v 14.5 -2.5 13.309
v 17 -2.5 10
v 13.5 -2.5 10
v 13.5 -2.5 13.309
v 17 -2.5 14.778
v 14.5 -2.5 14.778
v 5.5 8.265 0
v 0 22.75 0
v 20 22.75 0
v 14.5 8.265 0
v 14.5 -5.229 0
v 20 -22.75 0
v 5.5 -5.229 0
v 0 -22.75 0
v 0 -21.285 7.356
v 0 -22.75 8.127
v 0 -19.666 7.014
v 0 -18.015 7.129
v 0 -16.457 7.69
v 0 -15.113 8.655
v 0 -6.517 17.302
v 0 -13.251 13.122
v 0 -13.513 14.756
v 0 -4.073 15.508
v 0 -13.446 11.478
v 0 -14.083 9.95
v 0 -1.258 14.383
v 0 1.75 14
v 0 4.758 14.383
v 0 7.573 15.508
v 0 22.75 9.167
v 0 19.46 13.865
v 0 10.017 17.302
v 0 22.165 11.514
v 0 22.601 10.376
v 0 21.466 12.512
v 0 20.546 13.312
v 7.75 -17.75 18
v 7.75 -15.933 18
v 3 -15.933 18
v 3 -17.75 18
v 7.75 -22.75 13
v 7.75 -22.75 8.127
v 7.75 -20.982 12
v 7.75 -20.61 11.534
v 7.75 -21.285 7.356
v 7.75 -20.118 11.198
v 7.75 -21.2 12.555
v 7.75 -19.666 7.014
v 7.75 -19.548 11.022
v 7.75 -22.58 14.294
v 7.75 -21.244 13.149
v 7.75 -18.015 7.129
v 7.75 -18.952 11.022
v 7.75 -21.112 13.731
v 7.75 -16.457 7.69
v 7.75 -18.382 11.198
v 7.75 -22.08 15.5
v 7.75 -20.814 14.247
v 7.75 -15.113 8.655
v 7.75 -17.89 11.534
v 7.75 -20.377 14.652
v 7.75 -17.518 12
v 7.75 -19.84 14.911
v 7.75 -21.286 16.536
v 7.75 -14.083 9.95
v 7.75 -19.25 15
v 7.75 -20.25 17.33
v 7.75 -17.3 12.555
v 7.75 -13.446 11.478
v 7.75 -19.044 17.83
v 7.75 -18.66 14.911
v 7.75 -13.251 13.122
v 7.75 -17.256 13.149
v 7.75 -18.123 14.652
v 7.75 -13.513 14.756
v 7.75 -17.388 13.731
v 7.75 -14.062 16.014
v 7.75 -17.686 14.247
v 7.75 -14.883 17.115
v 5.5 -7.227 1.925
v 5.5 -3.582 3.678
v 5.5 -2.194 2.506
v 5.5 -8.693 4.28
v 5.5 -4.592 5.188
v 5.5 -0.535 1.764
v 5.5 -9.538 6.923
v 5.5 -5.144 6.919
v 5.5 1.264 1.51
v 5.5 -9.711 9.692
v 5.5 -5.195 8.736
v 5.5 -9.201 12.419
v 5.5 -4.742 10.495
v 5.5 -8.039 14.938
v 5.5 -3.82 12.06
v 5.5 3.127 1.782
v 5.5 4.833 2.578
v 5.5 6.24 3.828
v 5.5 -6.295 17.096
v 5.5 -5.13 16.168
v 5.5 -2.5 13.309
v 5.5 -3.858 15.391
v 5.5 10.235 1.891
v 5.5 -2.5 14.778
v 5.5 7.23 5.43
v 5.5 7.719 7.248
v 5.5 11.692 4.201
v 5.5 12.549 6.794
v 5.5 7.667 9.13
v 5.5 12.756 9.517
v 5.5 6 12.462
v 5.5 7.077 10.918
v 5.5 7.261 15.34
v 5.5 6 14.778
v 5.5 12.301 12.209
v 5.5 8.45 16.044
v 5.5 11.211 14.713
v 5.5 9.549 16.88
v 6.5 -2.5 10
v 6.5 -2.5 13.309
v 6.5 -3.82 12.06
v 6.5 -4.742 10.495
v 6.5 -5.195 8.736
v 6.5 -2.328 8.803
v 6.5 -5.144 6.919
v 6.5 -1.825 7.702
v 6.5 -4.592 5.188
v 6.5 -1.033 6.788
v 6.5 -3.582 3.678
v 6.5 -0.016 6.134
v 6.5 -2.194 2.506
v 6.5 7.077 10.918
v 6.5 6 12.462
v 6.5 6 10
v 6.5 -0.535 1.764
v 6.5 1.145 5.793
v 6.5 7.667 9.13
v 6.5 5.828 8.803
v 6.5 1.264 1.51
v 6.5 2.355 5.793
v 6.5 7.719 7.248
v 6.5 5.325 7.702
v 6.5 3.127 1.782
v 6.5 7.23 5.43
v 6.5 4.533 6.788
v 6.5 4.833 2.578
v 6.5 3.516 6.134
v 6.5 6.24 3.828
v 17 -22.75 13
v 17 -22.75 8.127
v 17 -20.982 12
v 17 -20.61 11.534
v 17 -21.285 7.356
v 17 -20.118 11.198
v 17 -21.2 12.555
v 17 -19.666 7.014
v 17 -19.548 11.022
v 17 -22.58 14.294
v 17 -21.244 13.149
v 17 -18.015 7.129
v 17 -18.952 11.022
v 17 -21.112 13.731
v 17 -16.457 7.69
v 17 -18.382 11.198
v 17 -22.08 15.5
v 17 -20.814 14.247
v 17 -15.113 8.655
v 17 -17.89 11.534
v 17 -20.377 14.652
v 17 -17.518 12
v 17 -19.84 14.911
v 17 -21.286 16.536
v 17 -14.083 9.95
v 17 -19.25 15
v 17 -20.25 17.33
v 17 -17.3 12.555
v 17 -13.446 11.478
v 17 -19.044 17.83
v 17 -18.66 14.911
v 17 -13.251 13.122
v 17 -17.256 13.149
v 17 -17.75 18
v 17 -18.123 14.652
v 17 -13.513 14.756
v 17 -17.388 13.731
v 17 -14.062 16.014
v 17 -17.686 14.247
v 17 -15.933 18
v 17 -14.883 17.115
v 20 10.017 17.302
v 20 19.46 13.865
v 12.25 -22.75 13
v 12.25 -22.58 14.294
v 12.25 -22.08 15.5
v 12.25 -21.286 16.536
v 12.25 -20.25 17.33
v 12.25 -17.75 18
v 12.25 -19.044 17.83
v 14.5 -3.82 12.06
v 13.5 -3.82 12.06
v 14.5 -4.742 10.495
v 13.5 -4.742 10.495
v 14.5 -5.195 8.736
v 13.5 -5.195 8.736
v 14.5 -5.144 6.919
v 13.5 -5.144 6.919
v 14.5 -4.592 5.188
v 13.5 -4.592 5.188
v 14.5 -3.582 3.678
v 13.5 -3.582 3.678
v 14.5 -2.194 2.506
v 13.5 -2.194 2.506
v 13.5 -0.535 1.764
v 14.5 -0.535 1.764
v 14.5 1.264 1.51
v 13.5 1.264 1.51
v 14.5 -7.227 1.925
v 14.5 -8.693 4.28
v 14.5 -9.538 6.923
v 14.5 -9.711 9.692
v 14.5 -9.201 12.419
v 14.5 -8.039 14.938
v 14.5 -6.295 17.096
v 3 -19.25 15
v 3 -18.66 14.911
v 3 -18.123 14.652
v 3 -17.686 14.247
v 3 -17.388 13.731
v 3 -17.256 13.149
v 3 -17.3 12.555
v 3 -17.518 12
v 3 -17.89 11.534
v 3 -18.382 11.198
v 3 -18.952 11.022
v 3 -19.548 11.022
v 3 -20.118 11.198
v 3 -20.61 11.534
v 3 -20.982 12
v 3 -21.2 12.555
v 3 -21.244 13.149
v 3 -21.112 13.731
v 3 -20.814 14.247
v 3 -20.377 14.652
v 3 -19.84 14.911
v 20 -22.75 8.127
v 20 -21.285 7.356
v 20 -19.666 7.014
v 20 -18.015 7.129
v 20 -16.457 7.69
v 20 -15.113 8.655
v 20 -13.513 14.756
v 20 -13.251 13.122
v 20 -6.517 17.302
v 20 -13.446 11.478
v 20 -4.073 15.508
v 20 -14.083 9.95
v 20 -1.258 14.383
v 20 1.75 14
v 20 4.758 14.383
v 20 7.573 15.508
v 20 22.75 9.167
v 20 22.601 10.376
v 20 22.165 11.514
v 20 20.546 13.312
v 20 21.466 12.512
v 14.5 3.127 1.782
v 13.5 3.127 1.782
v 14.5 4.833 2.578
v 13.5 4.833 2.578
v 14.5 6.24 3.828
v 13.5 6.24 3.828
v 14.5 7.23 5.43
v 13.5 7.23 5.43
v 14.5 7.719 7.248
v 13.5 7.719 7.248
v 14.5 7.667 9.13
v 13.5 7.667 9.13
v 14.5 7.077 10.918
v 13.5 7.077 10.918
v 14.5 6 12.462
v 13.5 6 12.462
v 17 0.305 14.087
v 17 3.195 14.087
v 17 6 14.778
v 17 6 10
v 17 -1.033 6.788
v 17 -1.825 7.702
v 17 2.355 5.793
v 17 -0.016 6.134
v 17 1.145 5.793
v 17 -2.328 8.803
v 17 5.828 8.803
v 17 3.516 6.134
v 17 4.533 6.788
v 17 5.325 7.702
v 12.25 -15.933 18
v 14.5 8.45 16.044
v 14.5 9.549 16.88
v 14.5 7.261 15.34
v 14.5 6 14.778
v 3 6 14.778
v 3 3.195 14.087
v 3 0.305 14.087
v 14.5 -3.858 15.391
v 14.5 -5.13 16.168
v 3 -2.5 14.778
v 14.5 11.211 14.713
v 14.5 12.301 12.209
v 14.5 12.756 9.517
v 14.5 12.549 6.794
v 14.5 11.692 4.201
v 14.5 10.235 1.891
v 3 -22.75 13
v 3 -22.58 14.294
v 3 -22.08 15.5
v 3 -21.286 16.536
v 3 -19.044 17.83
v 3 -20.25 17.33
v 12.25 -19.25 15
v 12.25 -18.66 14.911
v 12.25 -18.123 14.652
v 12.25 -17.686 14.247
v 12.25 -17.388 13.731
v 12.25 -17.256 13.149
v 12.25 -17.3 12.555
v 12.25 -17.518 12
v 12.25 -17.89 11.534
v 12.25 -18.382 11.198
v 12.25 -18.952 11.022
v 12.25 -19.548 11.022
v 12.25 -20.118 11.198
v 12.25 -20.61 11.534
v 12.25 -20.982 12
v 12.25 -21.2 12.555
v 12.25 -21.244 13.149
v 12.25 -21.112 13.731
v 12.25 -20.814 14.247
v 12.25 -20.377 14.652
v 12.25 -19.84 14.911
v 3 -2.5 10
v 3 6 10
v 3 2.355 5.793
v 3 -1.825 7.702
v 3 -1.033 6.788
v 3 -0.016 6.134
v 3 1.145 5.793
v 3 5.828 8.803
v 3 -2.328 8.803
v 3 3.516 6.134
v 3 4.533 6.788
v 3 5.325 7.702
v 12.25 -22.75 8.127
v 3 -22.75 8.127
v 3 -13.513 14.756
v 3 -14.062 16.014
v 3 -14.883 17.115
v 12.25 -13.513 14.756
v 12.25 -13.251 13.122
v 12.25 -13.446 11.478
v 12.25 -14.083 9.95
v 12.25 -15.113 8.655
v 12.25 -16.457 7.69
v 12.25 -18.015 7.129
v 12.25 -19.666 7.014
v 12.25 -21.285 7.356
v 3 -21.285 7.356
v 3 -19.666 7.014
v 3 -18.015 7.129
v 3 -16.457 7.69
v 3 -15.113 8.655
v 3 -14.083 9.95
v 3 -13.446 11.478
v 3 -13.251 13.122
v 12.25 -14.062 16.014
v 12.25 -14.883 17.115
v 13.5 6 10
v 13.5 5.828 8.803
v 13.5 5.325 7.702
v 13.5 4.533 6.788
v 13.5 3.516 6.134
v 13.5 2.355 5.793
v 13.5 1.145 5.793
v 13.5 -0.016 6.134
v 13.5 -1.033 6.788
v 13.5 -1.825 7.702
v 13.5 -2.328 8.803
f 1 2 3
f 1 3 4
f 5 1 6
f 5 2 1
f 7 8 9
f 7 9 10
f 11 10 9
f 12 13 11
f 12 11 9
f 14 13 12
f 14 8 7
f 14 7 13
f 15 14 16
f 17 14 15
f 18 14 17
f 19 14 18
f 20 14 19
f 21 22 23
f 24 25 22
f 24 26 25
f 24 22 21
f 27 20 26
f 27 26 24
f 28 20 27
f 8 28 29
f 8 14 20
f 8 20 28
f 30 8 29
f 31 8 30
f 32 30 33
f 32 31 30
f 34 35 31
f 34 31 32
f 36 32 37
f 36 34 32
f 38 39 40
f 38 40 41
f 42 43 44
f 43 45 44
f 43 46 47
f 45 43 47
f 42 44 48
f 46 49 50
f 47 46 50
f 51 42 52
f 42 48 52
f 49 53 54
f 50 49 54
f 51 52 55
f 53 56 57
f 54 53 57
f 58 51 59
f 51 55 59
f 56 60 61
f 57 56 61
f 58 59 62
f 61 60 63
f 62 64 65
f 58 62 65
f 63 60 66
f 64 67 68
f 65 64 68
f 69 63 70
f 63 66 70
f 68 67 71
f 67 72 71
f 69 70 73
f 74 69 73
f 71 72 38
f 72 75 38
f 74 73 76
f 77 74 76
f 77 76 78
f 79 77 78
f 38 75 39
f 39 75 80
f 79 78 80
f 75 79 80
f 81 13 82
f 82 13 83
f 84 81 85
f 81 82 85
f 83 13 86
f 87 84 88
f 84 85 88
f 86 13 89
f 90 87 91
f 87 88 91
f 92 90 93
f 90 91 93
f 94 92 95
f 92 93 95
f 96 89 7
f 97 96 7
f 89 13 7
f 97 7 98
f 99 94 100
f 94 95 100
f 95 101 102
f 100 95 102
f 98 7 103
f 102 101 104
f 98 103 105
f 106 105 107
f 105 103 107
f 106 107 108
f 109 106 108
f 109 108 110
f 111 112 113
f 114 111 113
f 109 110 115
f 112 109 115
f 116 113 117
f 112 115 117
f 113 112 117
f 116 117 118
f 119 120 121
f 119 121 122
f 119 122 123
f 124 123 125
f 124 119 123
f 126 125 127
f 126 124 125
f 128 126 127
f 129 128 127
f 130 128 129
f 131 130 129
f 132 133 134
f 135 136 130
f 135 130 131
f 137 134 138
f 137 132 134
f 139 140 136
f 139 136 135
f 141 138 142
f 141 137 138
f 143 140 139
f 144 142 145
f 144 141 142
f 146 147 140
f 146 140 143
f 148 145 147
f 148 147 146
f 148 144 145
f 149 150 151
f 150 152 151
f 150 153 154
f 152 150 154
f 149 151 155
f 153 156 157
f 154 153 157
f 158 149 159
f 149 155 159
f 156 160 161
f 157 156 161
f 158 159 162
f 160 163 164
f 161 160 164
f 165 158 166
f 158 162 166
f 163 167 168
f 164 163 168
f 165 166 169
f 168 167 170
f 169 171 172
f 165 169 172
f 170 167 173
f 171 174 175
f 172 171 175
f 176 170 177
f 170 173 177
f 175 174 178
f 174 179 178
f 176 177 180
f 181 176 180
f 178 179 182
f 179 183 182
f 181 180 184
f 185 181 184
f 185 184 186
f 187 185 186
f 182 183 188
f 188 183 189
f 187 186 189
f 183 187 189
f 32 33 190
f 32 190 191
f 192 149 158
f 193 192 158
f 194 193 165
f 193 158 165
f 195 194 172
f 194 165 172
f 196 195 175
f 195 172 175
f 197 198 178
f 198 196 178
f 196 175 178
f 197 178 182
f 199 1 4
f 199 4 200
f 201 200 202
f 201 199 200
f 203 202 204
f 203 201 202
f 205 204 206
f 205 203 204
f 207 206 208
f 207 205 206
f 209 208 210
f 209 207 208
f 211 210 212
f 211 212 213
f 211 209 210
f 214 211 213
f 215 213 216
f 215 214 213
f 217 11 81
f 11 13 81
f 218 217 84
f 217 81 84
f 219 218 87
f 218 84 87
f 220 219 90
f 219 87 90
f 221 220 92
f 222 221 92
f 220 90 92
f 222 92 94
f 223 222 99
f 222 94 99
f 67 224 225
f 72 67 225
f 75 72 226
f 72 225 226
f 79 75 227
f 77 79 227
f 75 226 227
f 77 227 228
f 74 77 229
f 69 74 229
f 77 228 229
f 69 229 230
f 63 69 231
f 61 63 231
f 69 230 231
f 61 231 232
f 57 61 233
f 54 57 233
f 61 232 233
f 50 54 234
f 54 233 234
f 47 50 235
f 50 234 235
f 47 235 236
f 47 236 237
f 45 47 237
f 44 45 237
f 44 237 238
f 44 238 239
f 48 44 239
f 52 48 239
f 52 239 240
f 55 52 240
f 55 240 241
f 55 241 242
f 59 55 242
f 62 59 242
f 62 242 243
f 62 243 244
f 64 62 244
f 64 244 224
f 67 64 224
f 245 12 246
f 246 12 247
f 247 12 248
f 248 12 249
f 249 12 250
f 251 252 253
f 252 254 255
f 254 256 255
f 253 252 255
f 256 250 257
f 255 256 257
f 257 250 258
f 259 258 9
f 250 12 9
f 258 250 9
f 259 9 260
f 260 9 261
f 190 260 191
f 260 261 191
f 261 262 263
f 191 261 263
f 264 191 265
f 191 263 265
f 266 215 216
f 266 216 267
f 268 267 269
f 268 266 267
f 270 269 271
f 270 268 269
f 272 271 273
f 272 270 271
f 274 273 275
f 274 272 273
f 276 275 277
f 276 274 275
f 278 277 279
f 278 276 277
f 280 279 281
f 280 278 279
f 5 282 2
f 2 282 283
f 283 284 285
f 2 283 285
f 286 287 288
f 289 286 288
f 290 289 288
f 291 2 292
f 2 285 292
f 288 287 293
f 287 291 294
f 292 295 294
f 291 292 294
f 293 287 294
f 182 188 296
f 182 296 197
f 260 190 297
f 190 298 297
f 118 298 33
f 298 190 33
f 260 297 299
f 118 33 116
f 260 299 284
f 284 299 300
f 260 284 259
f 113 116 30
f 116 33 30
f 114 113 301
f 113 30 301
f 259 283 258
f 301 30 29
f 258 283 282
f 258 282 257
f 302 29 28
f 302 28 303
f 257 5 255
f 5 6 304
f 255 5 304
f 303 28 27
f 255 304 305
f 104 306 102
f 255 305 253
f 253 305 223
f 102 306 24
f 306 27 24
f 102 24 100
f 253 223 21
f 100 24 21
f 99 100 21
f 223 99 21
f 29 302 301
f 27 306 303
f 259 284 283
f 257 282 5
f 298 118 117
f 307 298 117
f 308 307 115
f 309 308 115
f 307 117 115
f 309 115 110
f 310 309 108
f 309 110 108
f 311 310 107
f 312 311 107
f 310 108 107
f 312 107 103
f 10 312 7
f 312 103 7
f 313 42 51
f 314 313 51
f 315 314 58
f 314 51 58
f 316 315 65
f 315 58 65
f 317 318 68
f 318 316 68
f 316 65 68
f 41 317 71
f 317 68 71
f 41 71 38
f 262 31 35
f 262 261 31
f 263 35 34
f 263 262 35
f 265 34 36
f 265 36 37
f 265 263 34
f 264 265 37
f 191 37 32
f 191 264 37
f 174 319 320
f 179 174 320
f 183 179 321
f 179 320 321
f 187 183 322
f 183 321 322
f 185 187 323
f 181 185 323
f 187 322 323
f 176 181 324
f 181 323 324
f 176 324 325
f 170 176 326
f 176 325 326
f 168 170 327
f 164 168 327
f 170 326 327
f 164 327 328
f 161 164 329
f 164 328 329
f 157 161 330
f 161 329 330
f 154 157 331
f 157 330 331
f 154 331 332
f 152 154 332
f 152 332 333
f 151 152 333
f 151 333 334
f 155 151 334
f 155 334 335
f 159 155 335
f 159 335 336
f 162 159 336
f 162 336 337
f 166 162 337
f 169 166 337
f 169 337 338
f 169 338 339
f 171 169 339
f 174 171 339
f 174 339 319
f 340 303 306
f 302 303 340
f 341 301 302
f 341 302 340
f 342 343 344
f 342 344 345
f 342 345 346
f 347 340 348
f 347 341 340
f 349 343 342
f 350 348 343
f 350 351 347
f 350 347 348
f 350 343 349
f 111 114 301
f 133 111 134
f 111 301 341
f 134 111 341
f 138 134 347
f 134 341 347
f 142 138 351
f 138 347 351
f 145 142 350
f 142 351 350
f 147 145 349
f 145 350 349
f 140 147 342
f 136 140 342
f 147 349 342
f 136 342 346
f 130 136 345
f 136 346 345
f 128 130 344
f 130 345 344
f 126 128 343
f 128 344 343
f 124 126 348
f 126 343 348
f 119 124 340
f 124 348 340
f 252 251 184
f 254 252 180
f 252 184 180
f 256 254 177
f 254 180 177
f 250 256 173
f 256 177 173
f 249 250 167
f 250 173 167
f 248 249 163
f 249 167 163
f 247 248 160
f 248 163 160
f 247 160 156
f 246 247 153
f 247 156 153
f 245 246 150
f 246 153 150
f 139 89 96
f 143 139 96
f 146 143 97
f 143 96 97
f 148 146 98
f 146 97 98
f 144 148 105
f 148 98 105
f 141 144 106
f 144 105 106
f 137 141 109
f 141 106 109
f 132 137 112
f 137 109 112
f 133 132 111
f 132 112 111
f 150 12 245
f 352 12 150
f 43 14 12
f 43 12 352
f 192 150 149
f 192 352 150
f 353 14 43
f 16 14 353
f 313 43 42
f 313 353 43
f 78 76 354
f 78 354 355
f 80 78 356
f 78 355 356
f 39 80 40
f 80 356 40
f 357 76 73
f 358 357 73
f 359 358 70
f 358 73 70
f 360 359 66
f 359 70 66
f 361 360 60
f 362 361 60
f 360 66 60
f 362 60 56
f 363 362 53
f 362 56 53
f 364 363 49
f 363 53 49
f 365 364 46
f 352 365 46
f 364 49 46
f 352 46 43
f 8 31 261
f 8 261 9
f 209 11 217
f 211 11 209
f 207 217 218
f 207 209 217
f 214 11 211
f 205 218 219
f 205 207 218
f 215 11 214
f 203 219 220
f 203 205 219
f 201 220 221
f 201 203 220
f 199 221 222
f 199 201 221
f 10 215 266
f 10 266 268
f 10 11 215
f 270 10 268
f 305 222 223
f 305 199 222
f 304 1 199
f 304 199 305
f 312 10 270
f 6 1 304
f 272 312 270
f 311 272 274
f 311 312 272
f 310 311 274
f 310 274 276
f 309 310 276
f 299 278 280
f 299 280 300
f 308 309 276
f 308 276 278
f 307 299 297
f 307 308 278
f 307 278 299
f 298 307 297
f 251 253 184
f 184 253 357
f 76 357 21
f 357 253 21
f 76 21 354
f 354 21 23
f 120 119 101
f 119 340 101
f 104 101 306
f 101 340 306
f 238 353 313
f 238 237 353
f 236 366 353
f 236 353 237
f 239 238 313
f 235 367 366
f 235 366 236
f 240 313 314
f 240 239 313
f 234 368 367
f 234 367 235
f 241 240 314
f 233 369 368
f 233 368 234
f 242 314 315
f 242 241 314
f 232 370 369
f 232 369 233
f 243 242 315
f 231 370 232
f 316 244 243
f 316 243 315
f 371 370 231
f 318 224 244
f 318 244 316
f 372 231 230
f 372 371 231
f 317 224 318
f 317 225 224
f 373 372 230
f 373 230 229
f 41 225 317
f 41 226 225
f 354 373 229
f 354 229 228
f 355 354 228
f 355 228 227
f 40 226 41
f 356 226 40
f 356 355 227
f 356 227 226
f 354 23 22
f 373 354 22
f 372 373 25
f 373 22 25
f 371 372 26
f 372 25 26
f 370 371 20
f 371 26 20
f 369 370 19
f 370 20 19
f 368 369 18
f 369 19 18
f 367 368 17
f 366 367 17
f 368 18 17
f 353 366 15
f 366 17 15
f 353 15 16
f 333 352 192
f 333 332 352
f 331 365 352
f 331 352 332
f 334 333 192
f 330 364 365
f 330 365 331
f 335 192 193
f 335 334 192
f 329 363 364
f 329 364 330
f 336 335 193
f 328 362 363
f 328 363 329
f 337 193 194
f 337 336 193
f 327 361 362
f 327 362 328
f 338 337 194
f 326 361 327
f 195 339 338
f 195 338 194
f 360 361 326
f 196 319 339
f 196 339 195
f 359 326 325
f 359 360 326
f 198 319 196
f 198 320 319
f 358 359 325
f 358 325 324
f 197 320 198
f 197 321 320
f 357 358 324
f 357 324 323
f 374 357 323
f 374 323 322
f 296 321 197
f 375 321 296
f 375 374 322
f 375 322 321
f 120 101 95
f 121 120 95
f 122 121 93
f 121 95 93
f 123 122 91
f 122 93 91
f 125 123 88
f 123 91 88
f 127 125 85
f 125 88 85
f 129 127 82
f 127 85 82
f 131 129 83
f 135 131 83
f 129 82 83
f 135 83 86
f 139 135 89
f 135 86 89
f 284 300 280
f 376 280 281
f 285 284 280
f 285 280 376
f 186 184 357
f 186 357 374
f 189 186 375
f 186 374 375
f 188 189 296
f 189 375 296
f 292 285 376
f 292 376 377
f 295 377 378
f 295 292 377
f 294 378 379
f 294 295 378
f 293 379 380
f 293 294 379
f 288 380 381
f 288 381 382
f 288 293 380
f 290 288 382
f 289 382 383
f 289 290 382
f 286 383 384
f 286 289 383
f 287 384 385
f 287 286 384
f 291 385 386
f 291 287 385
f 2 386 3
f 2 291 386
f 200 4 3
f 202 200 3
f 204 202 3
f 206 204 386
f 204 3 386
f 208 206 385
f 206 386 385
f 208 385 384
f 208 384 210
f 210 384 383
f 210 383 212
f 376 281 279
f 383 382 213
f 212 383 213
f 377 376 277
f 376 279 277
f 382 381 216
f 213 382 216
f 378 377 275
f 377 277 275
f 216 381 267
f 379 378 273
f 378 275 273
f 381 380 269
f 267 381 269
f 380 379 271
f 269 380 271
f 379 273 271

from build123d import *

# Parameters (mm, degrees)
BOSS_EXTRU_1_DEPTH      = 20
ENL_V_MAT_EXTRU_1_REACH = 22
ESQUISSE2_R             = 2
ESQUISSE2_R_2           = 12
ENL_V_START             = -3
ENL_V_MAT_EXTRU_7_DEPTH = 14
CONG_1_R                = 5
ESQUISSE5_R             = 11.25
ENL_V_MAT_EXTRU_2_DEPTH = 4.5
BOSS_EXTRU_2_DEPTH      = 1
ESQUISSE11_R            = 6
ENL_V_MAT_EXTRU_3_DEPTH = 2.25
ENL_V_START_2           = 10
ENL_V_MAT_EXTRU_4_DEPTH = 3
ENL_V_START_3           = -7
ESQUISSE11_3_R          = 6
ENL_V_MAT_EXTRU_5_DEPTH = 3
ENL_V_MAT_EXTRU_6_DEPTH = 20


with BuildPart() as part:
    # Esquisse1 → Boss.-Extru.1 (new body)
    with BuildSketch(Plane(origin=(0, 0, 0), x_dir=(0, 0, -1), z_dir=(1, 0, 0))):
        Polygon((0, 22.75), (0, -22.75), (-18, -22.75), (-18, -8.1), (-18, 8.1), (-12.667836068, 22.75), align=None)
    extrude(amount=BOSS_EXTRU_1_DEPTH)

    # Esquisse2 → Enl_v. mat.-Extru.1 (cut, up to next)
    with BuildSketch(Plane.ZY, mode=Mode.PRIVATE) as enl_v_mat_extru_1_sk1:
        with Locations((13, -19.25)):
            Circle(ESQUISSE2_R)
    enl_v_mat_extru_1_tool1 = extrude(enl_v_mat_extru_1_sk1.sketch, amount=-ENL_V_MAT_EXTRU_1_REACH, mode=Mode.PRIVATE) & part.part
    add(enl_v_mat_extru_1_tool1.solids().sort_by_distance((0, -19.25, 13))[0], mode=Mode.SUBTRACT)
    # Esquisse2 → Enl_v. mat.-Extru.1 (cut, up to next)
    with BuildSketch(Plane.ZY, mode=Mode.PRIVATE) as enl_v_mat_extru_1_sk2:
        with Locations((26, 1.75)):
            Circle(ESQUISSE2_R_2)
    enl_v_mat_extru_1_tool2 = extrude(enl_v_mat_extru_1_sk2.sketch, amount=-ENL_V_MAT_EXTRU_1_REACH, mode=Mode.PRIVATE) & part.part
    add(enl_v_mat_extru_1_tool2.solids().sort_by_distance((0, 1.75, 26))[0], mode=Mode.SUBTRACT)

    # Esquisse14 → Enl_v. mat.-Extru.7 (cut)
    with BuildSketch(Plane.ZY.offset(ENL_V_START)):
        with BuildLine():
            Line((10, 6), (14.777812156, 6))
            ThreePointArc((14.777812156, 6), (14, 1.75), (14.777812156, -2.5))
            Line((14.777812156, -2.5), (10, -2.5))
            ThreePointArc((10, -2.5), (5.75, 1.75), (10, 6))
        make_face()
    extrude(amount=-ENL_V_MAT_EXTRU_7_DEPTH, mode=Mode.SUBTRACT)

    # Cong_1
    cong_1_edges = [part.edges().sort_by_distance(p)[0] for p in [
        (10, -22.75, 18),
        (10, 22.75, 12.667836068),
    ]]
    fillet(cong_1_edges, radius=CONG_1_R)

    # Esquisse5 → Enl_v. mat.-Extru.2 (cut, symmetric)
    with BuildSketch(Plane.ZY.offset(-10)):
        with Locations((9.002244805, 1.517900266)):
            Circle(ESQUISSE5_R)
    extrude(amount=ENL_V_MAT_EXTRU_2_DEPTH, both=True, mode=Mode.SUBTRACT)

    # Esquisse8 → Boss.-Extru.2 (add)
    with BuildSketch(Plane(origin=(5.5, 0, 0), x_dir=(0, 0, -1), z_dir=(1, 0, 0))):
        with BuildLine():
            Line((-12.461710624, 6), (-10, 6))
            ThreePointArc((-10, 6), (-5.75, 1.75), (-10, -2.5))
            Line((-10, -2.5), (-13.309218442, -2.5))
            ThreePointArc((-13.309218442, -2.5), (-6.034488781, -4.92870357), (-1.509850884, 1.263868155))
            ThreePointArc((-1.509850884, 1.263868155), (-5.429840061, 7.229900685), (-12.461710624, 6))
        make_face()
    boss_extru_2 = extrude(amount=BOSS_EXTRU_2_DEPTH)

    # Sym_trie1: Boss.-Extru.2 across plane
    add(boss_extru_2.mirror(Plane.ZY.offset(-10)))

    # Esquisse11 → Enl_v. mat.-Extru.3 (cut, symmetric)
    with BuildSketch(Plane.ZY.offset(-10)):
        with Locations((13, -19.25)):
            Circle(ESQUISSE11_R)
    extrude(amount=ENL_V_MAT_EXTRU_3_DEPTH, both=True, mode=Mode.SUBTRACT)

    # Esquisse11 → Enl_v. mat.-Extru.4 (cut)
    with BuildSketch(Plane.ZY.offset(-10).offset(ENL_V_START_2)):
        with Locations((13, -19.25)):
            Circle(ESQUISSE11_R)
    extrude(amount=-ENL_V_MAT_EXTRU_4_DEPTH, mode=Mode.SUBTRACT)

    # Esquisse11_3 → Enl_v. mat.-Extru.5 (cut)
    with BuildSketch(Plane.ZY.offset(-10).offset(ENL_V_START_3)):
        with Locations((13, -19.25)):
            Circle(ESQUISSE11_3_R)
    extrude(amount=-ENL_V_MAT_EXTRU_5_DEPTH, mode=Mode.SUBTRACT)

    # Esquisse13 → Enl_v. mat.-Extru.6 (cut)
    with BuildSketch(Plane.ZY):
        with BuildLine():
            Line((18, -7.19427191), (17.30217057, -6.517270602))
            Line((17.30217057, -6.517270602), (14.75603403, -13.512723252))
            ThreePointArc((14.75603403, -13.512723252), (16.588298751, -14.441246308), (18, -15.93337521))
            Line((18, -15.93337521), (18, -7.19427191))
        make_face()
    extrude(amount=-ENL_V_MAT_EXTRU_6_DEPTH, mode=Mode.SUBTRACT)


solid = part.part
